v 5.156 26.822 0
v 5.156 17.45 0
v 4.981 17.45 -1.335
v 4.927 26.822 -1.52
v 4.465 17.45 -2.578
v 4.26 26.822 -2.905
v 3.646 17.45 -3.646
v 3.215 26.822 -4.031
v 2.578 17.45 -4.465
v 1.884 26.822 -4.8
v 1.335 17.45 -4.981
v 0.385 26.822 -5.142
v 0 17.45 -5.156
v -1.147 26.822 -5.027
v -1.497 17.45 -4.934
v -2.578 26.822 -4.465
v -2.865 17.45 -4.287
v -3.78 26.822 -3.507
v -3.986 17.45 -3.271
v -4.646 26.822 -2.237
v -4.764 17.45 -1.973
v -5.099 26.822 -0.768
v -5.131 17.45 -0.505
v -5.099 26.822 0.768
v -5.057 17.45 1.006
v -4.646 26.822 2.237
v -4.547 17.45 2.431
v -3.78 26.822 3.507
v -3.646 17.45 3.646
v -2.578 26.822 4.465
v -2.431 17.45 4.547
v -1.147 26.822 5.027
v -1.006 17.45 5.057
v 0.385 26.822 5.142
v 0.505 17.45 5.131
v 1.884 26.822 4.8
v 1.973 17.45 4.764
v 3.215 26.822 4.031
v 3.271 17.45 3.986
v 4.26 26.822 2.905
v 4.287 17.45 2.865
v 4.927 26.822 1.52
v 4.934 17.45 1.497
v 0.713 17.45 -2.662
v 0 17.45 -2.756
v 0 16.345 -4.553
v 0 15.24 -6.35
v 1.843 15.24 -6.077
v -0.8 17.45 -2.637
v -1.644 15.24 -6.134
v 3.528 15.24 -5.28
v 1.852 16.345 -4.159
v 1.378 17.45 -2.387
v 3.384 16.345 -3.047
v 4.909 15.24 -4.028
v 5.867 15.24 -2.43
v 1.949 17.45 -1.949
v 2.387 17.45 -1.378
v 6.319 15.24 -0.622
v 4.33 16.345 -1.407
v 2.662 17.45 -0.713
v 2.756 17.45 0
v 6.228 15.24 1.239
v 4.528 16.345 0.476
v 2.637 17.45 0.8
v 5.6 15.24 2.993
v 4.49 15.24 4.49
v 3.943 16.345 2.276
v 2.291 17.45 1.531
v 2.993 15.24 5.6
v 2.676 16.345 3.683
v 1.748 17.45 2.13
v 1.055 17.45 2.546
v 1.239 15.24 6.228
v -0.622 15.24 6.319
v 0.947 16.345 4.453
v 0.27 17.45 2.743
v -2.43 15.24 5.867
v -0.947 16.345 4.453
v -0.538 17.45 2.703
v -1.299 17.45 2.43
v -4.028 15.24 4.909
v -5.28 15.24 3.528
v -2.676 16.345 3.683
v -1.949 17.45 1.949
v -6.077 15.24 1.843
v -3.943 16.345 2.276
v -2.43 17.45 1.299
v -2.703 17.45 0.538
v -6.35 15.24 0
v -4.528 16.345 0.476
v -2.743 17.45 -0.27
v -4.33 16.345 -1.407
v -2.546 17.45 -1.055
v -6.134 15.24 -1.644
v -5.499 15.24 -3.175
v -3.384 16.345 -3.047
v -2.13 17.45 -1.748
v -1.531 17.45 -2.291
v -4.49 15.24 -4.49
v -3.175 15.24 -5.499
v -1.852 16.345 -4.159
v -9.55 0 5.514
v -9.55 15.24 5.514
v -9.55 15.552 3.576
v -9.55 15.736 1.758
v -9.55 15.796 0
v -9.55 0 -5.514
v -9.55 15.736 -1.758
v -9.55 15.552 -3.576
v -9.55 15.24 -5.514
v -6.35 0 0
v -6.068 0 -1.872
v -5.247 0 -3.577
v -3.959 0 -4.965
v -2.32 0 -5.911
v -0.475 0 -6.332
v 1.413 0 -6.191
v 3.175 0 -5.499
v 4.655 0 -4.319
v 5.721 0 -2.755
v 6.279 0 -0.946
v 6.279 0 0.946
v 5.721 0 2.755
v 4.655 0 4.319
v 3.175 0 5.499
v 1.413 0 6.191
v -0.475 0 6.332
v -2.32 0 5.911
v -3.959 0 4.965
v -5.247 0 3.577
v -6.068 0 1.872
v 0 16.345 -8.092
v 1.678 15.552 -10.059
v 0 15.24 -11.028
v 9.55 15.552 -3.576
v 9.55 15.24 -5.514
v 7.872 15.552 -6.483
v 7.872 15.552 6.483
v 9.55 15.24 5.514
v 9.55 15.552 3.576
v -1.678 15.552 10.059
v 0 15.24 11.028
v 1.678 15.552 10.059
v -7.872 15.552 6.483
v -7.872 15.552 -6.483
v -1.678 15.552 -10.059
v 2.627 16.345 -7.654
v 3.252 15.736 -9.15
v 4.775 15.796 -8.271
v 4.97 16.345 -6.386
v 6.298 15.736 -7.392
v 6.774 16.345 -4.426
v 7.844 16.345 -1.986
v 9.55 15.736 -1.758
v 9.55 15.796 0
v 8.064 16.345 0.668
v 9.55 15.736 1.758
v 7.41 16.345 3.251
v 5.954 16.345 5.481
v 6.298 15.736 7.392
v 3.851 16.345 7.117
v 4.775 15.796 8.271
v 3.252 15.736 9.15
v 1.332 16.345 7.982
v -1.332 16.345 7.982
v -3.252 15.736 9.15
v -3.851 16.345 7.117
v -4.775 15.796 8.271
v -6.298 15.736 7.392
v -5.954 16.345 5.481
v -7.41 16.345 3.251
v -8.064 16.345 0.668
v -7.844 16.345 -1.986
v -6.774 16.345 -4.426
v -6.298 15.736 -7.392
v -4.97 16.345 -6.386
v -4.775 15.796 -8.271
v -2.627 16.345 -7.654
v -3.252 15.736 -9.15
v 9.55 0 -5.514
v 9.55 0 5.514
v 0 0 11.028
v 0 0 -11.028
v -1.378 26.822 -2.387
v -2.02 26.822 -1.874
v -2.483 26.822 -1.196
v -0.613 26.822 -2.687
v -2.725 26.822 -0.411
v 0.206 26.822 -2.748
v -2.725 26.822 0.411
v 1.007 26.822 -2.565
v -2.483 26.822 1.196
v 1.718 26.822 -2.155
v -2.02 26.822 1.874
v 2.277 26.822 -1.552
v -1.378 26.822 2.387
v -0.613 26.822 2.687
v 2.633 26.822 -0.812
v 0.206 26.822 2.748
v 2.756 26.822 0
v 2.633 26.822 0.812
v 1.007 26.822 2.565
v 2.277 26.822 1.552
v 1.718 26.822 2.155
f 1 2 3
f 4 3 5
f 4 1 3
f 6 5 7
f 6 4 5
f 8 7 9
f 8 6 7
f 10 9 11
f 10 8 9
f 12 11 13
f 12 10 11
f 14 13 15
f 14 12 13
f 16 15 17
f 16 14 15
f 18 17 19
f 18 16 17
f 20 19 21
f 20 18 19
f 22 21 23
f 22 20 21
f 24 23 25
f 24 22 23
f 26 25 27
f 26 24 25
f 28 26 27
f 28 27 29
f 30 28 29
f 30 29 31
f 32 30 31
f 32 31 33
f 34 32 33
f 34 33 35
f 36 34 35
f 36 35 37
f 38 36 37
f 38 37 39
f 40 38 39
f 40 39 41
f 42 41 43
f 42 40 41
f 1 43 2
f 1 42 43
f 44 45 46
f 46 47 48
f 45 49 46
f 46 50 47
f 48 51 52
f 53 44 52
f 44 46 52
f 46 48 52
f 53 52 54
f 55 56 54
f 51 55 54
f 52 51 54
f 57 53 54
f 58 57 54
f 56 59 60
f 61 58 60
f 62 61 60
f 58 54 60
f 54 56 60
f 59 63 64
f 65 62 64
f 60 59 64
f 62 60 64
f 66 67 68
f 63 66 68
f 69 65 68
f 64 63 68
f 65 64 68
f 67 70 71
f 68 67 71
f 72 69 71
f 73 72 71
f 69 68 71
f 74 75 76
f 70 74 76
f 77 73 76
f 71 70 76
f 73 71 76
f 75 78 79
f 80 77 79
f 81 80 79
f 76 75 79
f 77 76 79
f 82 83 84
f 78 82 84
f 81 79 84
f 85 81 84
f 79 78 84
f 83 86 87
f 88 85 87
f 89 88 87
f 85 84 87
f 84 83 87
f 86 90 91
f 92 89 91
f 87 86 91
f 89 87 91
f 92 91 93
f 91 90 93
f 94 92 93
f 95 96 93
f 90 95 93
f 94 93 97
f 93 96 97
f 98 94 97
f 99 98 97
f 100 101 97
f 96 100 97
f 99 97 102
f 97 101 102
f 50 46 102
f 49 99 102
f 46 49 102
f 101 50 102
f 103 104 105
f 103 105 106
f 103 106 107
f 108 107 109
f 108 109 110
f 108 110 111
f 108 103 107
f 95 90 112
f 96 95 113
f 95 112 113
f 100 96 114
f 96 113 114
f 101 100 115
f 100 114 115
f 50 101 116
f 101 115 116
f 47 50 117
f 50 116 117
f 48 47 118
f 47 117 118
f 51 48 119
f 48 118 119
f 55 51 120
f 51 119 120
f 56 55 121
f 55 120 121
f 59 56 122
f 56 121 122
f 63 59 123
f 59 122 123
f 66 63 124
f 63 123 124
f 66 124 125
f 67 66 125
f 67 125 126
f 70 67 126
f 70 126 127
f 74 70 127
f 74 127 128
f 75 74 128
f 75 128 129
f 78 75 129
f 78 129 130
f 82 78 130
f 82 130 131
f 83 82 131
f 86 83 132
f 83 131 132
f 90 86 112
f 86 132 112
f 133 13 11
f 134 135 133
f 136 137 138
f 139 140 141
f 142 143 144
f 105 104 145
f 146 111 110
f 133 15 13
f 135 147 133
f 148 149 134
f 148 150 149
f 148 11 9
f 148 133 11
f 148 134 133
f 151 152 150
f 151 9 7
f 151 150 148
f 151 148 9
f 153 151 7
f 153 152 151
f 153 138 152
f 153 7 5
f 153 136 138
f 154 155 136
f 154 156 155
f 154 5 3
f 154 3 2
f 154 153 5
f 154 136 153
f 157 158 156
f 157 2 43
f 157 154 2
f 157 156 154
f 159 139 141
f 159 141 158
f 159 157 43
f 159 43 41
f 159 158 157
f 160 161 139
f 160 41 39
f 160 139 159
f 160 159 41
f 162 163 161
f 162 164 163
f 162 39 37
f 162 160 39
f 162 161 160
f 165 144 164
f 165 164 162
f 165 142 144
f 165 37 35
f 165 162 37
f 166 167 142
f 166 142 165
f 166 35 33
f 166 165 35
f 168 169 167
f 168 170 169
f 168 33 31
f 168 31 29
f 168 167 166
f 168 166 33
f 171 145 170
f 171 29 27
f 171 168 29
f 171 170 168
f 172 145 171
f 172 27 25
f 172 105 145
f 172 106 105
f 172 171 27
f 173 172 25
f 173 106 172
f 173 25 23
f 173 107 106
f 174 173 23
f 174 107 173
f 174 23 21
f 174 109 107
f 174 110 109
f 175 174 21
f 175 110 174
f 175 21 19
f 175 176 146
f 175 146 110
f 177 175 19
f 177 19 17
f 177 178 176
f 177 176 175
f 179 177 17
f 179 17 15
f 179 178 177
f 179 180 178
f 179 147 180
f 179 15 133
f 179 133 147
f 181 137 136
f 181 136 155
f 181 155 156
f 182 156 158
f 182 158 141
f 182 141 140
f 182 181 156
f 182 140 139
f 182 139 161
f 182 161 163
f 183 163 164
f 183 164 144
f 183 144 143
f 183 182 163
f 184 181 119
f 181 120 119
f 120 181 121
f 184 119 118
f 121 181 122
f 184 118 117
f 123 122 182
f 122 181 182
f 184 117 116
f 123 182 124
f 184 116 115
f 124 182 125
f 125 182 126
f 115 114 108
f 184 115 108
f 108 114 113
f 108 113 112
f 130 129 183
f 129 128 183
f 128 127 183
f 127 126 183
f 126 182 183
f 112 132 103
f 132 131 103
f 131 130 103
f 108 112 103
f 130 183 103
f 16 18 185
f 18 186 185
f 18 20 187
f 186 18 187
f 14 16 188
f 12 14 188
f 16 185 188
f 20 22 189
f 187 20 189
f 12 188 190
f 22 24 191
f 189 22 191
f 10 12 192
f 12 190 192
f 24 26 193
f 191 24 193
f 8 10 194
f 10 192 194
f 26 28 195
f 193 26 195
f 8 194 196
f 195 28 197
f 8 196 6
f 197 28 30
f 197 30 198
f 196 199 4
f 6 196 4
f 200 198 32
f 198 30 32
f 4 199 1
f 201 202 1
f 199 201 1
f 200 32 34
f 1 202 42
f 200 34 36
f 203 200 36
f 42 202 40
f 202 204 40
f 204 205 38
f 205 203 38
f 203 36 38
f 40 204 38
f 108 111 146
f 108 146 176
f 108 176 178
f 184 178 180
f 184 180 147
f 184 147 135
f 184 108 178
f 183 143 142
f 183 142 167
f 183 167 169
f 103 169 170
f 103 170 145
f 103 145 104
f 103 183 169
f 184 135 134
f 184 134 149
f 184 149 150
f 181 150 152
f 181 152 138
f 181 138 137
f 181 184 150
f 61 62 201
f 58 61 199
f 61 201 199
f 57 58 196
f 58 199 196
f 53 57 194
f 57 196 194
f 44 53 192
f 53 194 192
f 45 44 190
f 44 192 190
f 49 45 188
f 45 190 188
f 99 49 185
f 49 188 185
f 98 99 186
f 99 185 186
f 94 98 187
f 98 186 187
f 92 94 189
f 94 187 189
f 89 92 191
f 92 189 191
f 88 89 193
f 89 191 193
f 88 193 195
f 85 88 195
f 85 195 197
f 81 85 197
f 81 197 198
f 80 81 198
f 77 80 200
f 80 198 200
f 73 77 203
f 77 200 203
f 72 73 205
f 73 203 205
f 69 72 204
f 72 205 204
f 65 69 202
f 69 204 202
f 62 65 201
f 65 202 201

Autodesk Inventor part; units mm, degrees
ref_plane "YZ Plane" through (0, 0, 0) normal (1, 0, 0) x (0, 1, 0)
ref_plane "XZ Plane" through (0, 0, 0) normal (0, 1, 0) x (-1, 0, 0)
sketch "Sketch1" plane through (0, 0, 0) normal (0, 1, 0) x (-1, 0, 0)
  circle A0 centre (0, 0) radius 9.5504 construction
  line L0 (9.5504, -5.5139) -> (0, -11.0279)
  line L1 (0, -11.0279) -> (-9.5504, -5.5139)
  line L2 (-9.5504, -5.5139) -> (-9.5504, 5.5139)
  line L3 (-9.5504, 5.5139) -> (0, 11.0279)
  line L4 (0, 11.0279) -> (9.5504, 5.5139)
  line L5 (9.5504, 5.5139) -> (9.5504, -5.5139)
  circle A1 centre (0, 0) radius 6.35
  point P0 (9.5504, 0)
  dimension "d0" = 19.1008
  dimension "d1" = 12.7
extrude "Extrusion1" add sketch "Sketch1" along normal blind 15.24
ref_plane "Work Plane1" through (0, 26.8224, 0) normal (0, -1, 0) x (1, 0, 0)
sketch "Sketch2" plane through (0, 26.8224, 0) normal (0, -1, 0) x (1, 0, 0)
  circle A0 centre (0, 0) radius 2.7559
  circle A1 centre (0, 0) radius 5.1562
  dimension "d5" = 5.5118
  dimension "d6" = 10.3124
extrude "Extrusion2" add sketch "Sketch2" along normal blind 9.3726
sketch "Sketch3" plane through (0, 0, 0) normal (1, 0, 0) x (0, 1, 0)
  line L0 (15.24, -11.0279) -> (0, -11.0279) construction
  line L1 (0, -11.0279) -> (0, -6.35) construction
  line L2 (0, -6.35) -> (15.24, -6.35) construction
  line L3 (15.24, -6.35) -> (15.24, -11.0279) construction
  line L4 (0, 11.0279) -> (15.24, 11.0279) construction
  line L5 (15.24, 11.0279) -> (15.24, 6.35) construction
  line L6 (15.24, 6.35) -> (0, 6.35) construction
  line L7 (0, 6.35) -> (0, 11.0279) construction
  line L8 (26.8224, -5.1562) -> (17.4498, -5.1562) construction
  line L9 (17.4498, -5.1562) -> (17.4498, -2.7559) construction
  line L10 (17.4498, -2.7559) -> (26.8224, -2.7559) construction
  line L11 (26.8224, -2.7559) -> (26.8224, -5.1562) construction
  line L12 (17.4498, 5.1562) -> (26.8224, 5.1562) construction
  line L13 (26.8224, 5.1562) -> (26.8224, 2.7559) construction
  line L14 (26.8224, 2.7559) -> (17.4498, 2.7559) construction
  line L15 (17.4498, 2.7559) -> (17.4498, 5.1562) construction
  line L16 (17.4498, 5.1562) -> (17.4498, -5.1562) projected
  line L17 (17.4498, -2.7559) -> (17.4498, -5.1562)
  line L18 (17.4498, -5.1562) -> (15.24, -11.0279)
  line L19 (15.24, -6.35) -> (17.4498, -2.7559)
  line L20 (0, 0) -> (26.8224, 0) construction
  line L21 (15.24, -6.35) -> (15.24, -11.0279)
revolve "Revolution1" add sketch "Sketch3" angle 360 about axis through (0, 0, 0) along (0, 1, 0)
sketch "Sketch4" plane through (0, 0, 0) normal (0, -1, 0) x (1, 0, 0)
  circle A0 centre (0, 0) radius 6.35 construction
  line L0 (9.5504, -5.5139) -> (0, -11.0279) projected
  line L1 (0, -11.0279) -> (-9.5504, -5.5139) projected
  line L2 (-9.5504, -5.5139) -> (-9.5504, 5.5139) projected
  line L3 (-9.5504, 5.5139) -> (0, 11.0279) projected
  line L4 (0, 11.0279) -> (9.5504, 5.5139) projected
  line L5 (9.5504, 5.5139) -> (9.5504, -5.5139) projected
  line L6 (9.5504, 5.5139) -> (0, 11.0279) projected
  circle A1 centre (0, 0) radius 11.0279
extrude "Extrusion3" cut sketch "Sketch4" against normal through all contours A1 L0 | L5 A1 | A1 L1 | L4 A1 | A1 L2 | L3 A1
properties part number "am-2381" material "Brass"
